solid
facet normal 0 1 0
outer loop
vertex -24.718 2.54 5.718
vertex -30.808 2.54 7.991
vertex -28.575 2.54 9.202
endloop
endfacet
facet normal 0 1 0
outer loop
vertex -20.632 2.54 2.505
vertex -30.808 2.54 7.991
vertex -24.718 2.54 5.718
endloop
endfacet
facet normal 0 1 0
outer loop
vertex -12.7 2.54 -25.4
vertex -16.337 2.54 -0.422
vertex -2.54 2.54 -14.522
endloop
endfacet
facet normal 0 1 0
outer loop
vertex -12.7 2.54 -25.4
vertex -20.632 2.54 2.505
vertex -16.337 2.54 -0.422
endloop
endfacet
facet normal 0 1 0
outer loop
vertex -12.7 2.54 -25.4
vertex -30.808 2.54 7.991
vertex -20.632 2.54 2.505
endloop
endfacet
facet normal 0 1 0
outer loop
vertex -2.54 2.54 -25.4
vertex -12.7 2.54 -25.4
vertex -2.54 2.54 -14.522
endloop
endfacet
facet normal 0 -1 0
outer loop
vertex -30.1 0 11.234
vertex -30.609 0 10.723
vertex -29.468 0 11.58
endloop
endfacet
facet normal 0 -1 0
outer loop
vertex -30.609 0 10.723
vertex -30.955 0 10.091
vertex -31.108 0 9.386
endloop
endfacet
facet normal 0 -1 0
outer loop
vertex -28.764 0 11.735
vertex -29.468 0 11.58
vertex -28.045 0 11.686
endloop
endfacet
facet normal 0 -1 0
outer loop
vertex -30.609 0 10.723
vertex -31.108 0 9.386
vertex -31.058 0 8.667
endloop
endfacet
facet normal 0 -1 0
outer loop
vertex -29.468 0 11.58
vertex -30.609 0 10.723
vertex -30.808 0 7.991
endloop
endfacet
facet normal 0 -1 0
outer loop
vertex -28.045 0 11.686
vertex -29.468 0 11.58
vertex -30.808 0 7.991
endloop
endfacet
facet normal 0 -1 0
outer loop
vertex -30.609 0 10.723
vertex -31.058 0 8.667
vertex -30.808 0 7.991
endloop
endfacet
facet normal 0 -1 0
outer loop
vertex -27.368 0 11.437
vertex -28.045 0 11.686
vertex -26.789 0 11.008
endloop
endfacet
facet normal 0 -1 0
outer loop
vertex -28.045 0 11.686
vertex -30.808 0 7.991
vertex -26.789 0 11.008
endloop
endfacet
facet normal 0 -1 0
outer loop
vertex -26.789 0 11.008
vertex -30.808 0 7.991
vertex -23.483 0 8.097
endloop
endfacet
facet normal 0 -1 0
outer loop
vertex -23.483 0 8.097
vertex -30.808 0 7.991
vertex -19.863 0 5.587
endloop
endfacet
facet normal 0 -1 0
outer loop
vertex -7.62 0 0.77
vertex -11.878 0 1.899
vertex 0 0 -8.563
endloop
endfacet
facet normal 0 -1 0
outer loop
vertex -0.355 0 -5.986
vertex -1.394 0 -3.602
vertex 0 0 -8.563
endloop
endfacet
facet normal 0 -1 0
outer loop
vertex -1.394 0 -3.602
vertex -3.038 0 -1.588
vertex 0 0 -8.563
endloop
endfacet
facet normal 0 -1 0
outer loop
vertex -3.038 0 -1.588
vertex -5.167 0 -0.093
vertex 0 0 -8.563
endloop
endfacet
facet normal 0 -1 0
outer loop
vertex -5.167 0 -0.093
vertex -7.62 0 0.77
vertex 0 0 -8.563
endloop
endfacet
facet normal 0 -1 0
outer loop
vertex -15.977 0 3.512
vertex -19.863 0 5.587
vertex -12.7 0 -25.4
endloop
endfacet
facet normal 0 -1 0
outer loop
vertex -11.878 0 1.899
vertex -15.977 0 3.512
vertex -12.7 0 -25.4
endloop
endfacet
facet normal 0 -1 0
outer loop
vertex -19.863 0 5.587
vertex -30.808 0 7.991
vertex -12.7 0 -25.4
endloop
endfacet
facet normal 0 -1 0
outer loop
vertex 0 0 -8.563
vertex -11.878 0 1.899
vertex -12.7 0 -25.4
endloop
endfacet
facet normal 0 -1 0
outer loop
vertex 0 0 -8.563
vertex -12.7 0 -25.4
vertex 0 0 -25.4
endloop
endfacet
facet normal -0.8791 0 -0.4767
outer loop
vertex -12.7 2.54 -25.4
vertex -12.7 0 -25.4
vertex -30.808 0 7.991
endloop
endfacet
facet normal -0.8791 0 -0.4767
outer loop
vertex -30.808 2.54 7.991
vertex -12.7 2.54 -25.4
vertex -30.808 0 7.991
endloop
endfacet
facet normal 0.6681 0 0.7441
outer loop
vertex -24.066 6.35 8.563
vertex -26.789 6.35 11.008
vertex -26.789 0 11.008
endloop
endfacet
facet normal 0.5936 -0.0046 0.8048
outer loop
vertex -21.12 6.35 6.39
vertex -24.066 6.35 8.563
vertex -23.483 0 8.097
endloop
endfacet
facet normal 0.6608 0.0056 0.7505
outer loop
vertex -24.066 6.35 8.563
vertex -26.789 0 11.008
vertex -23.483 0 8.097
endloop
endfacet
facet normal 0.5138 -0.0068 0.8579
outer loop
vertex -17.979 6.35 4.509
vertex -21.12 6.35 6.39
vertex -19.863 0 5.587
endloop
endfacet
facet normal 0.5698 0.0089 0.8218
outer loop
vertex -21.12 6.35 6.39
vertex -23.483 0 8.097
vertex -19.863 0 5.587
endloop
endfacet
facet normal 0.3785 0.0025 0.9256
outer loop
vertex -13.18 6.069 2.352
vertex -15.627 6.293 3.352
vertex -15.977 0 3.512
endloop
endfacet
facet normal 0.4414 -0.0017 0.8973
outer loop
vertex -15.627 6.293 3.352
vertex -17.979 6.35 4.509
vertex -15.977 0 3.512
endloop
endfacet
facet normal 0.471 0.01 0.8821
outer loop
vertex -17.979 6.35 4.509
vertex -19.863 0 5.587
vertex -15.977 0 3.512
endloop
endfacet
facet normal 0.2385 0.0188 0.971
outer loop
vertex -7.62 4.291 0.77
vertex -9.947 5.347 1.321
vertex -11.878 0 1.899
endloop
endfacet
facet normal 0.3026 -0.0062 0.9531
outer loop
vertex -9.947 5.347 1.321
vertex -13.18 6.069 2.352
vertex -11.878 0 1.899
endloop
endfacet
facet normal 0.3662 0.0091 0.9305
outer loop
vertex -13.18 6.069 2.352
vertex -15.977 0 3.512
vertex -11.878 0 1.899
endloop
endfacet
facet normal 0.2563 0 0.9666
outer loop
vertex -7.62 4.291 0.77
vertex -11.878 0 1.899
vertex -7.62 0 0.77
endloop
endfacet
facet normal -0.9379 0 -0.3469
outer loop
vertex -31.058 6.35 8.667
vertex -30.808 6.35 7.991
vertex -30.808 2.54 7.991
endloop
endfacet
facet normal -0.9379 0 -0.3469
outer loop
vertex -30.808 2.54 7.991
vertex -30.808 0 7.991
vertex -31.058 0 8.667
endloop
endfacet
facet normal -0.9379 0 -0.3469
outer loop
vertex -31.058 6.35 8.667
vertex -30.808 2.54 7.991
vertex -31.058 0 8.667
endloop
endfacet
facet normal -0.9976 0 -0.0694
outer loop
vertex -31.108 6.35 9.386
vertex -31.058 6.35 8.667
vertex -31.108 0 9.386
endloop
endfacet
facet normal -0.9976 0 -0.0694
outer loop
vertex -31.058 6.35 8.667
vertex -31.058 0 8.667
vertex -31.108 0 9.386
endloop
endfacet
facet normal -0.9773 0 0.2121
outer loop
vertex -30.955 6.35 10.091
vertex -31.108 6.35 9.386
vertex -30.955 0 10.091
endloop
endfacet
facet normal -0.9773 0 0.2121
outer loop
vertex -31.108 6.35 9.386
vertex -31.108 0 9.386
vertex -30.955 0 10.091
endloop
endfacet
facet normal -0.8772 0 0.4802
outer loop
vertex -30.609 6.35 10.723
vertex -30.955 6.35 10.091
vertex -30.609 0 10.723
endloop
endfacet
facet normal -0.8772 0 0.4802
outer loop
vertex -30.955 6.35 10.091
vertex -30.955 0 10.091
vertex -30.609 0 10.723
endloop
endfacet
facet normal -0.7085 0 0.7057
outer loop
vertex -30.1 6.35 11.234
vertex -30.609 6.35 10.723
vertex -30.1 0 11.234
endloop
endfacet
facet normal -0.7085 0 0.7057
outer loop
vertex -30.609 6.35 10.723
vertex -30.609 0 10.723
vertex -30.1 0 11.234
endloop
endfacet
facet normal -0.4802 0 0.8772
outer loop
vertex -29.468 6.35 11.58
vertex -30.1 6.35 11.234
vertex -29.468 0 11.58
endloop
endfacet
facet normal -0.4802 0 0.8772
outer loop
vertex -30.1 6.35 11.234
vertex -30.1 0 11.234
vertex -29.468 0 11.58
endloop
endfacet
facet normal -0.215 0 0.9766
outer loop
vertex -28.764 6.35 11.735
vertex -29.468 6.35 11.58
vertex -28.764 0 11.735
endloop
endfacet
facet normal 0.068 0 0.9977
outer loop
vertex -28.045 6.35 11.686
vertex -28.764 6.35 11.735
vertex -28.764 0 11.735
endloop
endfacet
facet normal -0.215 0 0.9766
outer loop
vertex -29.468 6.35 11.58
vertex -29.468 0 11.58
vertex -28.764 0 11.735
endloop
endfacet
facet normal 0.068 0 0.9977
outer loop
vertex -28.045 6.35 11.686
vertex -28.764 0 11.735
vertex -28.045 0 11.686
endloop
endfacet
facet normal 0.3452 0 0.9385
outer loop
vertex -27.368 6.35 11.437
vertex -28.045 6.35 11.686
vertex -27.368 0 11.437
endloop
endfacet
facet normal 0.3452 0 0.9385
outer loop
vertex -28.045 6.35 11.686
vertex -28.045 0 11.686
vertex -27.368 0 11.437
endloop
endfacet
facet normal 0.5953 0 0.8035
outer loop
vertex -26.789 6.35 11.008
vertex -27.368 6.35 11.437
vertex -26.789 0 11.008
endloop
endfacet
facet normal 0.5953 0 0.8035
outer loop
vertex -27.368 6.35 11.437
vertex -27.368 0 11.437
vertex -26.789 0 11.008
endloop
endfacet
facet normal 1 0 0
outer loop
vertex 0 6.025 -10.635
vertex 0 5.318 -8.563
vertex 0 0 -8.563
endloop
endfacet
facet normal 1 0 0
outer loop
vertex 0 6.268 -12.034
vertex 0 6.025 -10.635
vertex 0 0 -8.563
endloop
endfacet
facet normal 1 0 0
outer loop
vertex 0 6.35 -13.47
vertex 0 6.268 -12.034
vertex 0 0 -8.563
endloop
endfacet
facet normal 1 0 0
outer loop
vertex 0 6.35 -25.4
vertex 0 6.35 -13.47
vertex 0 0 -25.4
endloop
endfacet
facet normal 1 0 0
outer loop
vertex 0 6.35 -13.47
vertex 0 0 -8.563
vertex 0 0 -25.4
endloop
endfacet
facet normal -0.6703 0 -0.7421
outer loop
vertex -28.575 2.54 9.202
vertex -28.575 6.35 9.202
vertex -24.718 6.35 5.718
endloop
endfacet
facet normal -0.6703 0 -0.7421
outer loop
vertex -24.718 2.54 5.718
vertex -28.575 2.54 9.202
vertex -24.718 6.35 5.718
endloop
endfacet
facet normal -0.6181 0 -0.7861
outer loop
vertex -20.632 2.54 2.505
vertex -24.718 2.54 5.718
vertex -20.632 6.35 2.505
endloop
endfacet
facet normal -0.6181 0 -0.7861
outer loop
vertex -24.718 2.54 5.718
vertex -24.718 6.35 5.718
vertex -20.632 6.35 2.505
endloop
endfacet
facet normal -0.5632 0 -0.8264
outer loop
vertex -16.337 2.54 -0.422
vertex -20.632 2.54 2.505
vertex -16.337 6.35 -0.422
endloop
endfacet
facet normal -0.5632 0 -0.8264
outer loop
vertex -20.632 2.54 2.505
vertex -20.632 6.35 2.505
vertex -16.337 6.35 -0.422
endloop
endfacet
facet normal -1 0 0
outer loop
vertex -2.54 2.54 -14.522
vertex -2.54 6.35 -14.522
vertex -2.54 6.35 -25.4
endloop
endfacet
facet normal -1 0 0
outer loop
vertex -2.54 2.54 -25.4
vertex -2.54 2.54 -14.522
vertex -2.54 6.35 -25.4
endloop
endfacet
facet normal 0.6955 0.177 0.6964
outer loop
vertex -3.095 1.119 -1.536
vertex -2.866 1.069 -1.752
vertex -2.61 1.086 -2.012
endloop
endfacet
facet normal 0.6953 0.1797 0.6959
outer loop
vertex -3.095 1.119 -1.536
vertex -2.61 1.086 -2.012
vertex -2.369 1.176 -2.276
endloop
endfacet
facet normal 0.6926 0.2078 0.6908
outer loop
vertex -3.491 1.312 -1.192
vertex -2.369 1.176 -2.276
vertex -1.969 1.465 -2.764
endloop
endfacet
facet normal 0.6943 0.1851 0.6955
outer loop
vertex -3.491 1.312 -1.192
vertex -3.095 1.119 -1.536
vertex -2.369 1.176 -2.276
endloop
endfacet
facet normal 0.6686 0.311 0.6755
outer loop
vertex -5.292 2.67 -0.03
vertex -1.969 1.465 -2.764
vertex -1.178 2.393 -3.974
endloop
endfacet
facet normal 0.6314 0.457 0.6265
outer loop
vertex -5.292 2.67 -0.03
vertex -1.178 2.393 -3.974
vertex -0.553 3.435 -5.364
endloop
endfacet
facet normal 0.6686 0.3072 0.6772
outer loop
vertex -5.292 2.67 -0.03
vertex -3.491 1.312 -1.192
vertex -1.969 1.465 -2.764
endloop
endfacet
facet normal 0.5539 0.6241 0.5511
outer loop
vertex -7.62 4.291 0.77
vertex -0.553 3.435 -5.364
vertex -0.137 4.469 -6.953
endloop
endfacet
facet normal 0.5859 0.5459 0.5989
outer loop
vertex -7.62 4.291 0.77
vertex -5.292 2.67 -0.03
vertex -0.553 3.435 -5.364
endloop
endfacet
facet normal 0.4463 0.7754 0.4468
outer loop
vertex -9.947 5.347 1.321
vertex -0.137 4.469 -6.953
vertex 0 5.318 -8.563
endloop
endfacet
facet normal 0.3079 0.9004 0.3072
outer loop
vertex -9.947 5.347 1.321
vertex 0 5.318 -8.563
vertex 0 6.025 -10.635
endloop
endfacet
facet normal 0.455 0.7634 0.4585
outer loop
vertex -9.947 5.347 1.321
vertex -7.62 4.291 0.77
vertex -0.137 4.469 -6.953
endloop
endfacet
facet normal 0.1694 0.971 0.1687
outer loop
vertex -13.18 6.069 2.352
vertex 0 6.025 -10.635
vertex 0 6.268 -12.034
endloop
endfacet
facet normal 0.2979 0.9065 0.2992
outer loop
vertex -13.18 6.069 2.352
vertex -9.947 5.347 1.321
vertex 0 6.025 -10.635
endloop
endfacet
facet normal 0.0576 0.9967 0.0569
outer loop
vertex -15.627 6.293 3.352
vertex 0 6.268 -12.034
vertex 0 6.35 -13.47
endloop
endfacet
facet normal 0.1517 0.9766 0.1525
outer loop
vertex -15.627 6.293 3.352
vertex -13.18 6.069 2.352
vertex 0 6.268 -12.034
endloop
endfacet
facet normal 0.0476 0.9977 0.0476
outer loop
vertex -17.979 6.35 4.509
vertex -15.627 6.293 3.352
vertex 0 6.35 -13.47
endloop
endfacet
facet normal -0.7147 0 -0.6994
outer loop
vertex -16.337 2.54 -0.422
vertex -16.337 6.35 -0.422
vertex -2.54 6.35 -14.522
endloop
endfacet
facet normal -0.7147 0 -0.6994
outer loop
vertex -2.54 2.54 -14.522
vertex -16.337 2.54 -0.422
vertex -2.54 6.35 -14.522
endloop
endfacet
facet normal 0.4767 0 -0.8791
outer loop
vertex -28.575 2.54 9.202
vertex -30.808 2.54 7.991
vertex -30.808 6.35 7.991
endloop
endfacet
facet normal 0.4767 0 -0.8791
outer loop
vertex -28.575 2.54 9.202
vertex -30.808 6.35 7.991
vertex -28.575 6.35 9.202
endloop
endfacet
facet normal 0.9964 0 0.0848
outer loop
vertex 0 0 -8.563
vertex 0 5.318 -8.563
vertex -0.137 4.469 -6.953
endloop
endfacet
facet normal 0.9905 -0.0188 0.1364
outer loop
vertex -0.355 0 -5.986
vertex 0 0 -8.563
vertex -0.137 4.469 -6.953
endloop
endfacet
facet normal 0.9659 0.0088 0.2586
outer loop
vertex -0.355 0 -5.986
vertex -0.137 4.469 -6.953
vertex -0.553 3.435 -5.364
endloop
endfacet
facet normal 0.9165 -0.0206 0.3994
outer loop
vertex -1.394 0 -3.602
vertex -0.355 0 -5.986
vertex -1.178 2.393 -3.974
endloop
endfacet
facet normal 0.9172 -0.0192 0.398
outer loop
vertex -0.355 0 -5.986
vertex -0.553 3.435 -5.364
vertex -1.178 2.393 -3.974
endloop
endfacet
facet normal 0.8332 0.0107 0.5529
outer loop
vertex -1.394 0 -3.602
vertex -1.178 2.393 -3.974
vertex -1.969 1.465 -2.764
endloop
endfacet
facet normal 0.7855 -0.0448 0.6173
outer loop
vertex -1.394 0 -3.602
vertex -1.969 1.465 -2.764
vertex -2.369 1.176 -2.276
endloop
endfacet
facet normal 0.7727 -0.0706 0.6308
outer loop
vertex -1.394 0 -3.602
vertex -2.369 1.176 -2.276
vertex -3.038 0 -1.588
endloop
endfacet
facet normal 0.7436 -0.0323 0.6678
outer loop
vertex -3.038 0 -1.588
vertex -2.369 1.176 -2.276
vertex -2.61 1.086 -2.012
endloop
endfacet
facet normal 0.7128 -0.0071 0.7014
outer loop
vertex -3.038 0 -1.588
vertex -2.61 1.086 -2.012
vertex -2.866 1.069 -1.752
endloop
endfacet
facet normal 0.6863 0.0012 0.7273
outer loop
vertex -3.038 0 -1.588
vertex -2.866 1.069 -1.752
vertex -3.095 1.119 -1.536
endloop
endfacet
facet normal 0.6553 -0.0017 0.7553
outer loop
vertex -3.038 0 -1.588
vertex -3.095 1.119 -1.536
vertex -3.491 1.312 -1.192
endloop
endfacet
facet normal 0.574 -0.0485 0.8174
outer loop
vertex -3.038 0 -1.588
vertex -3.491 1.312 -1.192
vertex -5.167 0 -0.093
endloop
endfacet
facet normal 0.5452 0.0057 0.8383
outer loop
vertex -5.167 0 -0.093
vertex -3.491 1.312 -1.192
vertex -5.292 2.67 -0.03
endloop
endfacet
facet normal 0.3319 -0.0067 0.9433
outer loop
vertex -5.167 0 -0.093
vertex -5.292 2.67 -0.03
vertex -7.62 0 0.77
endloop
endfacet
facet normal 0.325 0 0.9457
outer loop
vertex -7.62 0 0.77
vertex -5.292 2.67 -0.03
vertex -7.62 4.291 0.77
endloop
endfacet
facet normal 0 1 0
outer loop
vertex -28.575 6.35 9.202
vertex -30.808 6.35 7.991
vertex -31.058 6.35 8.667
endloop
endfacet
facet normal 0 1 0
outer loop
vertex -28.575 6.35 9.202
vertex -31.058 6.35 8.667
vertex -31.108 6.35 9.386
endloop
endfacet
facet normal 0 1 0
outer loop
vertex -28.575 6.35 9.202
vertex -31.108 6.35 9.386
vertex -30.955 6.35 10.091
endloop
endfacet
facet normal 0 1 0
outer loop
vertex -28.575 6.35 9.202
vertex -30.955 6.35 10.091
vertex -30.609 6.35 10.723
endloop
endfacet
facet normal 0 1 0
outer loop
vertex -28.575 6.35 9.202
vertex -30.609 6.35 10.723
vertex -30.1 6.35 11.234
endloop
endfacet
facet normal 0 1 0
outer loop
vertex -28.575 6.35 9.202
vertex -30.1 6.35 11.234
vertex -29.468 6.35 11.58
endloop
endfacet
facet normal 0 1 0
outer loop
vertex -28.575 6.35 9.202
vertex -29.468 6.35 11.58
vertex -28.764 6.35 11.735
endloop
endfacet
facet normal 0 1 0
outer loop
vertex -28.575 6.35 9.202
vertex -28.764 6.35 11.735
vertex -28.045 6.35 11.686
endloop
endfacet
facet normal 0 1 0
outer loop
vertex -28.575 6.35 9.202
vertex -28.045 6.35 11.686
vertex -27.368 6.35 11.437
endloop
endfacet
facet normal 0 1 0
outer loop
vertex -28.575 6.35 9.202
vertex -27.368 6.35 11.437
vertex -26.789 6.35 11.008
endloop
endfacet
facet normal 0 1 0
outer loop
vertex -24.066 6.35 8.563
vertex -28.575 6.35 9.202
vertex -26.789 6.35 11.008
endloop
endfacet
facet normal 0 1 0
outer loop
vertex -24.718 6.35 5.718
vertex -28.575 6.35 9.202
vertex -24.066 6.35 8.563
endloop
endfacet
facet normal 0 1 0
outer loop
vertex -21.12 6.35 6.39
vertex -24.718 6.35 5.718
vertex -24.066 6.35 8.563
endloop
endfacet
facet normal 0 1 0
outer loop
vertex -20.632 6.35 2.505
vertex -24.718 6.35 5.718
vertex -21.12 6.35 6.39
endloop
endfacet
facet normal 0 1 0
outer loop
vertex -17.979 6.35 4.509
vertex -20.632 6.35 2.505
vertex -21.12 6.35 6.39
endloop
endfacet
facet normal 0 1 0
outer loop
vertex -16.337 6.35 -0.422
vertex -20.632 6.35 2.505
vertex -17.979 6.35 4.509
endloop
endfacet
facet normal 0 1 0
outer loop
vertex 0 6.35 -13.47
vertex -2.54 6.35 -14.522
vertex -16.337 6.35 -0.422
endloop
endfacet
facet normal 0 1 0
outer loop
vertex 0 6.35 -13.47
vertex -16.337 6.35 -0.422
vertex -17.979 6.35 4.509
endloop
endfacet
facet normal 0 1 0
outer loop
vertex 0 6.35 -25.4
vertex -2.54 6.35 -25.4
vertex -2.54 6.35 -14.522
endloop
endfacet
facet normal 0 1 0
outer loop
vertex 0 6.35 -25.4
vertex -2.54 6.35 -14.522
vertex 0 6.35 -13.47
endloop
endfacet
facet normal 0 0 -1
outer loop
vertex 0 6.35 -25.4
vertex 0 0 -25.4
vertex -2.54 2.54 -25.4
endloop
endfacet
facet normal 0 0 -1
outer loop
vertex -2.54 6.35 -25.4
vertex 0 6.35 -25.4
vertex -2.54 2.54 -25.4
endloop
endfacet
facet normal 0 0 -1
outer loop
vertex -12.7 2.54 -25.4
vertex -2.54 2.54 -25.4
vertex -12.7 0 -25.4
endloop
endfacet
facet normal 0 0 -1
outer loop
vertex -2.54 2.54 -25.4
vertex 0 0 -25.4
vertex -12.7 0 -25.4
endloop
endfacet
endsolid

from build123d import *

# Parameters (mm, degrees)
BOSS_EXTRUDE1_DEPTH     = 6.35
FILLET1_R               = 9.525
CUT_EXTRUDE1_DEPTH      = 41.664797122
CUT_EXTRUDE1_DEPTH_BACK = 41.664797122
CUT_EXTRUDE2_DEPTH      = 3.81


with BuildPart() as part:
    # Sketch2 → Boss-Extrude1 (new body)
    with BuildSketch(Plane(origin=(0, 0, 0), x_dir=(1, 0, 0), z_dir=(0, 1, 0))):
        with BuildLine():
            Line((0, 0), (0, 25.4))
            Line((0, 25.4), (-12.7, 25.4))
            Line((-12.7, 25.4), (-30.807819057, -7.991432922))
            ThreePointArc((-30.807819057, -7.991432922), (-30.099929857, -11.233569232), (-26.7890625, -11.008375273))
            ThreePointArc((-26.7890625, -11.008375273), (-14.481351765, -2.859392016), (0, 0))
        make_face()
    extrude(amount=BOSS_EXTRUDE1_DEPTH)

    # Fillet1
    fillet1_edges = [part.edges().sort_by_distance(p)[0] for p in [
        (0, 3.175, 0),
    ]]
    fillet(fillet1_edges, radius=FILLET1_R)

    # Sketch3 → Cut-Extrude1 (cut, two sides: drawn at the far end of the back side and taken through both)
    with BuildSketch(Plane(origin=(0, 0, 0), x_dir=(-0.7071067811865489, 0, -0.7071067811865462), z_dir=(0.7071067811865462, 0, -0.7071067811865489)).offset(-CUT_EXTRUDE1_DEPTH_BACK)):
        with BuildLine():
            Line((9.525, 6.35), (9.525, 7.810784714))
            Line((9.525, 7.810784714), (2.20669647, 7.810784714))
            Line((2.20669647, 7.810784714), (2.20669647, 0))
            Line((2.20669647, 0), (3.175, 0))
            ThreePointArc((3.175, 0), (5.034871939, 4.490128061), (9.525, 6.35))
        make_face()
    extrude(amount=CUT_EXTRUDE1_DEPTH + CUT_EXTRUDE1_DEPTH_BACK, mode=Mode.SUBTRACT)

    # Sketch4 → Cut-Extrude2 (cut)
    with BuildSketch(Plane(origin=(0, 6.35, 0), x_dir=(1, 0, 0), z_dir=(0, 1, 0))):
        with BuildLine():
            Line((-16.337070041, 0.422049177), (-2.54, 14.52248663))
            Line((-2.54, 14.52248663), (-2.54, 25.4))
            Line((-2.54, 25.4), (-12.7, 25.4))
            Line((-12.7, 25.4), (-30.807819057, -7.991432922))
            Line((-30.807819057, -7.991432922), (-28.575, -9.202266957))
            ThreePointArc((-28.575, -9.202266957), (-22.702482164, -4.076735677), (-16.337070041, 0.422049177))
        make_face()
    extrude(amount=-CUT_EXTRUDE2_DEPTH, mode=Mode.SUBTRACT)


solid = part.part
